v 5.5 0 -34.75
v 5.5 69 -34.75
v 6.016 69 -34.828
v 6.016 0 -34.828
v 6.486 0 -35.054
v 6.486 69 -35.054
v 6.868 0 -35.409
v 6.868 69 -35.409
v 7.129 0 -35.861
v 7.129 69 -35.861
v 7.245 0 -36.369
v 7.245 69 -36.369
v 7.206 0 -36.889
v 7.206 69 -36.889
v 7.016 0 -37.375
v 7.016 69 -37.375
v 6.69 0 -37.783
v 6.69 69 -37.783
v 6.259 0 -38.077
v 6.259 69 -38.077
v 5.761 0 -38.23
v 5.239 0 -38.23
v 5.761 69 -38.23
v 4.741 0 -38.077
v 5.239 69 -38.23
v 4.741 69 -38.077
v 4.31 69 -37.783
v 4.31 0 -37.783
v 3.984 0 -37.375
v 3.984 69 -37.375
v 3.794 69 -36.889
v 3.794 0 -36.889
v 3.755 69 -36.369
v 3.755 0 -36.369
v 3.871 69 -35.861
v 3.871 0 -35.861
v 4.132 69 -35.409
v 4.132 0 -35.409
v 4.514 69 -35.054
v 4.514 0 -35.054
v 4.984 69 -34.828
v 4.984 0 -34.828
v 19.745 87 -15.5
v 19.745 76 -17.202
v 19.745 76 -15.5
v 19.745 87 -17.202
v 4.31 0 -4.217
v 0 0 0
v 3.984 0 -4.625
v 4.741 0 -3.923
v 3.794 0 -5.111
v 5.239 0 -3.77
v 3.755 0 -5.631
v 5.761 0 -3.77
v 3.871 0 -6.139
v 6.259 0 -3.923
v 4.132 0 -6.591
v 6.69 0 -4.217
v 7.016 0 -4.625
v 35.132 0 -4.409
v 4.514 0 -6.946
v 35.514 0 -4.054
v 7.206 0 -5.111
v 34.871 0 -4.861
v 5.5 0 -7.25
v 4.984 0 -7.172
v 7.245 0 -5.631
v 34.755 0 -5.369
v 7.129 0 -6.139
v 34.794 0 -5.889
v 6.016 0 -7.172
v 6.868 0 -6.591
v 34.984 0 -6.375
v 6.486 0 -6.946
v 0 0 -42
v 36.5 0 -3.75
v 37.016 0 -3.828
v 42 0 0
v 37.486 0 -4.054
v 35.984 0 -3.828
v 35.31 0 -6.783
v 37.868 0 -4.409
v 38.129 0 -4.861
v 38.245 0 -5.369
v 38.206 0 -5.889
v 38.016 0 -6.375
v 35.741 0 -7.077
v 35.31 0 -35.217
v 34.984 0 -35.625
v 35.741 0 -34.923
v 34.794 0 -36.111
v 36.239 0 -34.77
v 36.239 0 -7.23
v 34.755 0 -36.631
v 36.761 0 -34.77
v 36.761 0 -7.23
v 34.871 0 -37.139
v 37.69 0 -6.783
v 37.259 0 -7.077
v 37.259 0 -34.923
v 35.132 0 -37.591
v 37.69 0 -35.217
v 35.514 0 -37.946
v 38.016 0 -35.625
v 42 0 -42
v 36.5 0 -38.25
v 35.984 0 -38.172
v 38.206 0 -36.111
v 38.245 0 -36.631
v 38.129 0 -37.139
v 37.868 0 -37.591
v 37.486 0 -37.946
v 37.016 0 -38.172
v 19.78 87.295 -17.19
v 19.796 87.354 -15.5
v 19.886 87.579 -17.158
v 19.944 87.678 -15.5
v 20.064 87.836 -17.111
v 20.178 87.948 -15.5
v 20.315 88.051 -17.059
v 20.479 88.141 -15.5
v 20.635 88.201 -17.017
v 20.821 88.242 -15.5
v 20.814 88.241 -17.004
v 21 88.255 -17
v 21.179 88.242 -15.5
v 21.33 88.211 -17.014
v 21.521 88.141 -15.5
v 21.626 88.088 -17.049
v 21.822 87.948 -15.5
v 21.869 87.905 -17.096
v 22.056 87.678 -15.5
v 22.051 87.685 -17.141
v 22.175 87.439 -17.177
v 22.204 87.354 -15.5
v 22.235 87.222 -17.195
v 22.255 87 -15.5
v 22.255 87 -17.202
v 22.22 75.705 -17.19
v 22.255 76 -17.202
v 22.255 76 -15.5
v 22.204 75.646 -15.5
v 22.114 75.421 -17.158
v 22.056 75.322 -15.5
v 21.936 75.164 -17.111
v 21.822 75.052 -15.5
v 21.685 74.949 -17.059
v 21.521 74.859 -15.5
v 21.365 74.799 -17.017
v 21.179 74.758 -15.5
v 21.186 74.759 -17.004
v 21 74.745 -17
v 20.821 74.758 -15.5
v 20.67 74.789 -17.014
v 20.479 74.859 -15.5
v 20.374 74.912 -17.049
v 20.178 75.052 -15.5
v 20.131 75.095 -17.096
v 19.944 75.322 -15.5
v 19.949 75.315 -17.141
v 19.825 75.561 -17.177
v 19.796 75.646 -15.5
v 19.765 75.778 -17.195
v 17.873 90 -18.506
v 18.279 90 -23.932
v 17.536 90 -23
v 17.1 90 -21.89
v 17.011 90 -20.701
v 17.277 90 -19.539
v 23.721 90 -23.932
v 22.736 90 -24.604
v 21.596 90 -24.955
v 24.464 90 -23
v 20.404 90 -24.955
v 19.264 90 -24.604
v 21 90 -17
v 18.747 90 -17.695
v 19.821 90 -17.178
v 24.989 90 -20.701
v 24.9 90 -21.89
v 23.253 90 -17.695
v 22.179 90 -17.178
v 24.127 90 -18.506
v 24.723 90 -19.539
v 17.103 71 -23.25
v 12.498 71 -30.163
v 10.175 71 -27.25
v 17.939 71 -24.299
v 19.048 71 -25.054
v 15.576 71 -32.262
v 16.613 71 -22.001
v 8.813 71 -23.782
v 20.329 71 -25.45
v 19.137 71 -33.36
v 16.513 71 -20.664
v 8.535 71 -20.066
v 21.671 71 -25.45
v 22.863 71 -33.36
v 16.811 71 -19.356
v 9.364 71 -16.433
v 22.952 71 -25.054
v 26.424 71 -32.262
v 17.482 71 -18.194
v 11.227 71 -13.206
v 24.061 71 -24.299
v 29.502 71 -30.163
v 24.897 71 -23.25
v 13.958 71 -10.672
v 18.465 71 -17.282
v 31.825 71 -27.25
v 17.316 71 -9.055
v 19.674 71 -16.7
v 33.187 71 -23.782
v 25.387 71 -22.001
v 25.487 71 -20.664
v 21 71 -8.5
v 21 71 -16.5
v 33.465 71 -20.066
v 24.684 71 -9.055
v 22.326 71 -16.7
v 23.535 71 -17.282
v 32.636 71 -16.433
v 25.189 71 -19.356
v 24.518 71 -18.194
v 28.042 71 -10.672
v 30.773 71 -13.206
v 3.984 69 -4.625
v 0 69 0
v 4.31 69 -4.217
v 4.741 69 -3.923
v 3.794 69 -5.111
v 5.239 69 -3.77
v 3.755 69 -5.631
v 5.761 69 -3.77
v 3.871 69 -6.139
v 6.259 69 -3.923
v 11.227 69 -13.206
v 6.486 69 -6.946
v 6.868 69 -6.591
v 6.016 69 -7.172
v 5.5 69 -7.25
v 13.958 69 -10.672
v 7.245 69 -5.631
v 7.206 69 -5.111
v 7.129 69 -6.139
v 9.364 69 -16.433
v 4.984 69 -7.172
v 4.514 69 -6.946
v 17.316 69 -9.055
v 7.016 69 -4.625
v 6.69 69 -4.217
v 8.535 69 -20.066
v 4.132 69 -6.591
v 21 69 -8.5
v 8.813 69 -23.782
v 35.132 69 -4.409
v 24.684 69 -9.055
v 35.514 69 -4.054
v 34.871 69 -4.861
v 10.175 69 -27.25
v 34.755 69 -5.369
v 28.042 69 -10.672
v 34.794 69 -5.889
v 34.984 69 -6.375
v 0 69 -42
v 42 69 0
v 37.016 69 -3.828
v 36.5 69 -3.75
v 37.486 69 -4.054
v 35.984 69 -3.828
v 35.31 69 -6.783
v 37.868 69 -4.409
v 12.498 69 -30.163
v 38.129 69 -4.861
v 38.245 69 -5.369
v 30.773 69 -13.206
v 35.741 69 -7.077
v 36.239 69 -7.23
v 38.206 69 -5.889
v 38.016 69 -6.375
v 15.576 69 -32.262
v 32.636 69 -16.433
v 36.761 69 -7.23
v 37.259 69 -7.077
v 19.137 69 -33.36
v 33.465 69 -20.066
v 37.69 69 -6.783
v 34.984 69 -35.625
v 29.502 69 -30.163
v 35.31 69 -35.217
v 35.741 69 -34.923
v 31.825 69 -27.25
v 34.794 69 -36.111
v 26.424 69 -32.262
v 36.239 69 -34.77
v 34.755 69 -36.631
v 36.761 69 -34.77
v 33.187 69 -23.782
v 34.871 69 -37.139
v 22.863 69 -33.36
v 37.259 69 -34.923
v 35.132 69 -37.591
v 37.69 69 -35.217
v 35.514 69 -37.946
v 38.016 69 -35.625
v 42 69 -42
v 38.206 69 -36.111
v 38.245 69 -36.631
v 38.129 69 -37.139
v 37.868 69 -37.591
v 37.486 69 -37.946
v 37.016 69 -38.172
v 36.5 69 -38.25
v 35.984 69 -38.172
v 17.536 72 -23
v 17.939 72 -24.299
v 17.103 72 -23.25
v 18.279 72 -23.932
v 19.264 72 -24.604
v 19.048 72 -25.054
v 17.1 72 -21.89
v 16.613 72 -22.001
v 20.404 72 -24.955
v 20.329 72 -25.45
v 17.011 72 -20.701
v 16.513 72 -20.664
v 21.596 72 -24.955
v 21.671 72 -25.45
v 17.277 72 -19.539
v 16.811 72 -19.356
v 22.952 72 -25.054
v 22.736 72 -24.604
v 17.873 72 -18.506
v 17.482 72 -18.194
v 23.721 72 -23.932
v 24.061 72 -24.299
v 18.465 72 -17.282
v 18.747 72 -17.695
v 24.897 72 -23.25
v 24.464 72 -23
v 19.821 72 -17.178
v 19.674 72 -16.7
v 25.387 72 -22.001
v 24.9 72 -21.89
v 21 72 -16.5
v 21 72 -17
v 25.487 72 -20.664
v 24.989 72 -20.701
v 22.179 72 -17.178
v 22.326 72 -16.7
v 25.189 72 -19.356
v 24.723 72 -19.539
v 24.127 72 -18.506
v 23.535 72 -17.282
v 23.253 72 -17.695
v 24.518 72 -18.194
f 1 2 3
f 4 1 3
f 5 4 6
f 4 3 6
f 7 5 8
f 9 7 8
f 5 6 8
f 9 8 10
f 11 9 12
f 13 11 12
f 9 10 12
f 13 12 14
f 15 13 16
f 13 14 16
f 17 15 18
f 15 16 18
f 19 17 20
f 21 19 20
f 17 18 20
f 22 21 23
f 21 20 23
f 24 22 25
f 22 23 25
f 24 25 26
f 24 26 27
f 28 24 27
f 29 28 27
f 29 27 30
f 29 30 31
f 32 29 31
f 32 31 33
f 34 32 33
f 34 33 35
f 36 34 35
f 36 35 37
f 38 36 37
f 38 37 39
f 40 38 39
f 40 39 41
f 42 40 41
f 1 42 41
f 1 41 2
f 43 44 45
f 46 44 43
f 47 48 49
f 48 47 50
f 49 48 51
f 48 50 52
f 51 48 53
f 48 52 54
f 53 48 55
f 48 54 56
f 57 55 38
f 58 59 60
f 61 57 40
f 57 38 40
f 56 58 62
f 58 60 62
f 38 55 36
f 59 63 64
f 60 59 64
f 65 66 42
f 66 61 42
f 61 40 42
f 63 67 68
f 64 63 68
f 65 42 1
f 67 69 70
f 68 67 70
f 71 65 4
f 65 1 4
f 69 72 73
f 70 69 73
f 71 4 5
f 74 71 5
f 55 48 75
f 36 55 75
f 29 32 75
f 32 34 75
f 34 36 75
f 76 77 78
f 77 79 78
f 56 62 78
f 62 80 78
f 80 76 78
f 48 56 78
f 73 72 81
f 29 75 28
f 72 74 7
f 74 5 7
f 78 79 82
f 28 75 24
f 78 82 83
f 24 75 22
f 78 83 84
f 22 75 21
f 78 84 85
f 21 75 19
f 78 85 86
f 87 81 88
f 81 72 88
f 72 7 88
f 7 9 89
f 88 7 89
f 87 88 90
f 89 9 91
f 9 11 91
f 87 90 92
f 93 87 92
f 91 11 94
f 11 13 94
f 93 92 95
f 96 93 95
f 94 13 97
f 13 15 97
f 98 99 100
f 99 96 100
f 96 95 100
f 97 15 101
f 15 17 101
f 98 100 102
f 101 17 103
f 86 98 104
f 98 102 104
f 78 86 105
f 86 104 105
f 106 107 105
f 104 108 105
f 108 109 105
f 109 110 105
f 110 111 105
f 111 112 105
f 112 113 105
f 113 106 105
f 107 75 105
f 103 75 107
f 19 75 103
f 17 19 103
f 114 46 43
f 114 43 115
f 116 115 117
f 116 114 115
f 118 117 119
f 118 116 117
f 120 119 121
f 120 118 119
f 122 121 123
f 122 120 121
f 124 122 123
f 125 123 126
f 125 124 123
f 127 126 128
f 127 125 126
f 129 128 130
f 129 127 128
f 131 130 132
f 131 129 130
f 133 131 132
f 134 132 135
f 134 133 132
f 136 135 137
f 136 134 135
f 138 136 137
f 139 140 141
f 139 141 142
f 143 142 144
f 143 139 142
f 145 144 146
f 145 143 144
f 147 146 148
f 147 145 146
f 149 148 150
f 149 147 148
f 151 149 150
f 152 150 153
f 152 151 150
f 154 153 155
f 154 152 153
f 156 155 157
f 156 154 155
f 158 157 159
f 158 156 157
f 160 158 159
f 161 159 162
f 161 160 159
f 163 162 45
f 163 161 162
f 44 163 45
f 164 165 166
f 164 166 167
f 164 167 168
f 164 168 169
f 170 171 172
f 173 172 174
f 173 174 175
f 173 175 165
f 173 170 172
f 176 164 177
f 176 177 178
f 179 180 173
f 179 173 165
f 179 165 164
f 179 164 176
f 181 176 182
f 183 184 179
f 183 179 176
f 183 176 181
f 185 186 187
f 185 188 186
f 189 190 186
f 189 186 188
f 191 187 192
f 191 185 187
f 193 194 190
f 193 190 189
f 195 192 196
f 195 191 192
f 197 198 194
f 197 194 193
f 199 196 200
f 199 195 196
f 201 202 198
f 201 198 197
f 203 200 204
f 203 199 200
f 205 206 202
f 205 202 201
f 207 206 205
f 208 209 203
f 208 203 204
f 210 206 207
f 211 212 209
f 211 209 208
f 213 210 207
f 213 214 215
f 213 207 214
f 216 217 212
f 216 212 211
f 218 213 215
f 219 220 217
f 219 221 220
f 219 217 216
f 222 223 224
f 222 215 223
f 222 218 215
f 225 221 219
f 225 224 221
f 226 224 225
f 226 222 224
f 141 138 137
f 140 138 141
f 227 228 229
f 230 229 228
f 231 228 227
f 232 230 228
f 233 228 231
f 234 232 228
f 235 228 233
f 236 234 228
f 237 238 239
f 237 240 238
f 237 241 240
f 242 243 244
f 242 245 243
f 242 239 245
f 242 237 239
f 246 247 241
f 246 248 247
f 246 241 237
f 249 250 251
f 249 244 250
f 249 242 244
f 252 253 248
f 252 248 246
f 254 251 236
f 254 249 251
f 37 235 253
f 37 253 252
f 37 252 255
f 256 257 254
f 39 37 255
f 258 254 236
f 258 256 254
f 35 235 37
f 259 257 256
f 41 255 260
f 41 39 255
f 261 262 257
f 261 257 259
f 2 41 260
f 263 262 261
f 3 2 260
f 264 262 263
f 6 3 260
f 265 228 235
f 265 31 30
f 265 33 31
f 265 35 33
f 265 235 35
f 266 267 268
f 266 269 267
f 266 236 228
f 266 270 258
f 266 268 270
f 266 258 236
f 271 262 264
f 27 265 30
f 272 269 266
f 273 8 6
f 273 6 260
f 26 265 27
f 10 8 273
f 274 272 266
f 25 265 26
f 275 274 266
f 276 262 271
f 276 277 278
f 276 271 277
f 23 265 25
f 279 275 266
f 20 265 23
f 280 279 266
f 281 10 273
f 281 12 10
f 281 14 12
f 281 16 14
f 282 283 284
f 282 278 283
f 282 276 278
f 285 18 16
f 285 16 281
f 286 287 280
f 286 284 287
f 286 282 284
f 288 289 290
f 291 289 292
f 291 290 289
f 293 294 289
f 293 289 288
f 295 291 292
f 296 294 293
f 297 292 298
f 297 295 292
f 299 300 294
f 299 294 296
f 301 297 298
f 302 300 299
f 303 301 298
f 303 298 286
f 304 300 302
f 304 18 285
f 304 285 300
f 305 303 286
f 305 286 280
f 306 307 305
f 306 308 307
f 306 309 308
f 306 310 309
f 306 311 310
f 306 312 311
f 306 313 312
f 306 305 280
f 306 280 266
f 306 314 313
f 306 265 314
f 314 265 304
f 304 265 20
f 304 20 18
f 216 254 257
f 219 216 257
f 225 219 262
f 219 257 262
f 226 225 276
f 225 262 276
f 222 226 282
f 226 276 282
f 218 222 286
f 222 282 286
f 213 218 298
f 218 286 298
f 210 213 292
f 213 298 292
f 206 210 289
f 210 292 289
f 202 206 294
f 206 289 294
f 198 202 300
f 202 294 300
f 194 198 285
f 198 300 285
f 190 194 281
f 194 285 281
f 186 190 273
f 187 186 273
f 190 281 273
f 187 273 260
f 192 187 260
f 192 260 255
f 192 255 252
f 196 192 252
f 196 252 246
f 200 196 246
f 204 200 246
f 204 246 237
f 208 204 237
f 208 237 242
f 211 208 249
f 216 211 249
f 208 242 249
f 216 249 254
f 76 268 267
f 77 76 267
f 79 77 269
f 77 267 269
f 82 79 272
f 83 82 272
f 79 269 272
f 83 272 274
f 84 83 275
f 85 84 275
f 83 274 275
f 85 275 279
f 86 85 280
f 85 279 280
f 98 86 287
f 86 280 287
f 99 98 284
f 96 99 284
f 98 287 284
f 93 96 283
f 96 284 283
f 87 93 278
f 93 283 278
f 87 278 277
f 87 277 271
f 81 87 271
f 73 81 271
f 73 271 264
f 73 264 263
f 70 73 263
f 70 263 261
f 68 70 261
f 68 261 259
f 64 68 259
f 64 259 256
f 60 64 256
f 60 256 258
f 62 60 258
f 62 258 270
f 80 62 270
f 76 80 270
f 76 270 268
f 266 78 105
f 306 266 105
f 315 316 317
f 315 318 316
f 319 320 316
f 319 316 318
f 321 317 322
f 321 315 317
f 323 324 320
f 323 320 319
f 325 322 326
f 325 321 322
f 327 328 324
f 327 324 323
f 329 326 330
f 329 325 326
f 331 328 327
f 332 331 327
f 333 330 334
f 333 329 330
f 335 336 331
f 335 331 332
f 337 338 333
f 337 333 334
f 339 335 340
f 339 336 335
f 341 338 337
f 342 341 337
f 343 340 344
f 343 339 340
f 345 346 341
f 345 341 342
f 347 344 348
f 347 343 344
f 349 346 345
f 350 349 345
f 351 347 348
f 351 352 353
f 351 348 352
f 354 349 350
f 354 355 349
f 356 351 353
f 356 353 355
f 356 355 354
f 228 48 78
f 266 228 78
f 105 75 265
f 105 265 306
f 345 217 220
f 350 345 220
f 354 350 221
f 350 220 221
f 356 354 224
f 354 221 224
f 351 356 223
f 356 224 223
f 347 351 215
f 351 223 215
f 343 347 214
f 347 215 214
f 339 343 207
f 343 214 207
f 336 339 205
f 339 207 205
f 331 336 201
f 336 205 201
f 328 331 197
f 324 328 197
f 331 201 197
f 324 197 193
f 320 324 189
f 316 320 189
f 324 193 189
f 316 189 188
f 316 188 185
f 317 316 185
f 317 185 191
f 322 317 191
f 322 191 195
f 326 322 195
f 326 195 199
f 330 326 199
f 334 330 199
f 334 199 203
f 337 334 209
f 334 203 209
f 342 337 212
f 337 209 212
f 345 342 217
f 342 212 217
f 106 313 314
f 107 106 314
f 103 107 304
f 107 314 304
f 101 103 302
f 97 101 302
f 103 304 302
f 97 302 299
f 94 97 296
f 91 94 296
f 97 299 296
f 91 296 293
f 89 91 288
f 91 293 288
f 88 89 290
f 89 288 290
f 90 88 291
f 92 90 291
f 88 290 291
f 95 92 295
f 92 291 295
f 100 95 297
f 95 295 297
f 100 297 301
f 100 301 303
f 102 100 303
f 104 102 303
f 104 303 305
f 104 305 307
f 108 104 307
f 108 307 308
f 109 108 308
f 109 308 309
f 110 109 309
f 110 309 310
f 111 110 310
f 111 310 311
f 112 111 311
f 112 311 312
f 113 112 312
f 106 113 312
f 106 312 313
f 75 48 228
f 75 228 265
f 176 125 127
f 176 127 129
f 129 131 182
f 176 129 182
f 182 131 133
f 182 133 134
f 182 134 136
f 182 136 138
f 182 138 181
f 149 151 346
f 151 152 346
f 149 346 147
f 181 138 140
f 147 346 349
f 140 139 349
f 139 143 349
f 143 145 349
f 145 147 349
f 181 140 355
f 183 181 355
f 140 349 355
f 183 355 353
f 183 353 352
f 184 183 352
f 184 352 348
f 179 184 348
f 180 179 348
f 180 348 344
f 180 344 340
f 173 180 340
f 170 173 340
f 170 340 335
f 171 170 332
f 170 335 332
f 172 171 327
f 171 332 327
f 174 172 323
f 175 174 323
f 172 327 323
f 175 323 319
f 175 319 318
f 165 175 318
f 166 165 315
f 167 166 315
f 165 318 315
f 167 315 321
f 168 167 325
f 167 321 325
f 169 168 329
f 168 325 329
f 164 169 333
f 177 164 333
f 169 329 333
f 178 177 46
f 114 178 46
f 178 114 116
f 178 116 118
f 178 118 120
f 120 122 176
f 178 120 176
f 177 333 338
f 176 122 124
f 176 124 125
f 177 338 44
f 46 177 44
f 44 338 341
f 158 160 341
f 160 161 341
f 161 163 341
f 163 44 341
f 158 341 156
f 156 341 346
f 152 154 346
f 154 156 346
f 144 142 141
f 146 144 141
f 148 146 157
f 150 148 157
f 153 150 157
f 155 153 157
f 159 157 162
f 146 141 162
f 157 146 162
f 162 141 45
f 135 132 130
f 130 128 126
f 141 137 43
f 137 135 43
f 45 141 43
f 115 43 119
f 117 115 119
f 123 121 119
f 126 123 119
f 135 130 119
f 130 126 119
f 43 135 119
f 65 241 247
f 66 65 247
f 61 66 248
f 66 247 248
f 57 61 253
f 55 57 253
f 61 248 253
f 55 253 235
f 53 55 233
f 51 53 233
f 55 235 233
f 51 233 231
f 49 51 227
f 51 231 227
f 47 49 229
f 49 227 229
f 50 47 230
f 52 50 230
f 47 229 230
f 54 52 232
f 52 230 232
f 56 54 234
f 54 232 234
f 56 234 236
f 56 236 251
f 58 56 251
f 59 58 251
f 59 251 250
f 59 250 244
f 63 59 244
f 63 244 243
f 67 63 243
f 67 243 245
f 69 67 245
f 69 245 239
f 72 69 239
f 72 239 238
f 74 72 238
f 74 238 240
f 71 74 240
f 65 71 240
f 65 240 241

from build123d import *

# Parameters (mm, degrees)
SKETCH_2_W           = 42
SKETCH_2_H           = 42
EXTRUDE_1_DEPTH      = 69
SKETCH_3_R           = 12.5
EXTRUDE_2_DEPTH      = 2
SKETCH_4_R           = 4.5
EXTRUDE_3_DEPTH      = 1
SKETCH_5_R           = 4
EXTRUDE_4_DEPTH      = 18
EXTRUDE_5_DEPTH      = 1.5
EXTRUDE_5_DEPTH_BACK = 4
SKETCH_7_R           = 1.75
CUT_EXTRUDE_1_DEPTH  = 71.5


with BuildPart() as part:
    # 草图2 → 凸台-拉伸1 (new body)
    with BuildSketch(Plane(origin=(0, 0, 0), x_dir=(1, 0, 0), z_dir=(0, 1, 0))):
        with Locations((21, 21)):
            Rectangle(SKETCH_2_W, SKETCH_2_H)
    extrude(amount=EXTRUDE_1_DEPTH)

    # 草图3 → 凸台-拉伸2 (add)
    with BuildSketch(Plane(origin=(0, 69, 0), x_dir=(1, 0, 0), z_dir=(0, 1, 0))):
        with Locations(Location((21, 21, 0), (0, 0, 270))):
            Circle(SKETCH_3_R)
    extrude(amount=EXTRUDE_2_DEPTH)

    # 草图4 → 凸台-拉伸3 (add)
    with BuildSketch(Plane(origin=(0, 71, 0), x_dir=(1, 0, 0), z_dir=(0, 1, 0))):
        with Locations(Location((21, 21, 0), (0, 0, 270))):
            Circle(SKETCH_4_R)
    extrude(amount=EXTRUDE_3_DEPTH)

    # 草图5 → 凸台-拉伸4 (add)
    with BuildSketch(Plane(origin=(0, 72, 0), x_dir=(1, 0, 0), z_dir=(0, 1, 0))):
        with Locations(Location((21, 21, 0), (0, 0, 270))):
            Circle(SKETCH_5_R)
    extrude(amount=EXTRUDE_4_DEPTH)

    # 草图6 → 凸台-拉伸5 (add, two sides: drawn at the far end of the back side and taken through both)
    with BuildSketch(Plane.XY.offset(-17).offset(-EXTRUDE_5_DEPTH_BACK)):
        with BuildLine():
            Line((22.254851431, 87), (22.254851431, 76))
            ThreePointArc((22.254851431, 76), (21, 74.745148569), (19.745148569, 76))
            Line((19.745148569, 76), (19.745148569, 87))
            ThreePointArc((19.745148569, 87), (21, 88.254851431), (22.254851431, 87))
        make_face()
    extrude(amount=EXTRUDE_5_DEPTH + EXTRUDE_5_DEPTH_BACK)

    # 草图7 → 切除-拉伸1 (cut)
    with BuildSketch(Plane(origin=(0, 69, 0), x_dir=(1, 0, 0), z_dir=(0, 1, 0))):
        with Locations(Location((5.5, 36.5, 0), (0, 0, 270))):
            Circle(SKETCH_7_R)
        with Locations(Location((36.5, 36.5, 0), (0, 0, 90))):
            Circle(SKETCH_7_R)
        with Locations(Location((36.5, 5.5, 0), (0, 0, 270))):
            Circle(SKETCH_7_R)
        with Locations(Location((5.5, 5.5, 0), (0, 0, 90))):
            Circle(SKETCH_7_R)
    extrude(amount=-CUT_EXTRUDE_1_DEPTH, mode=Mode.SUBTRACT)


solid = part.part
